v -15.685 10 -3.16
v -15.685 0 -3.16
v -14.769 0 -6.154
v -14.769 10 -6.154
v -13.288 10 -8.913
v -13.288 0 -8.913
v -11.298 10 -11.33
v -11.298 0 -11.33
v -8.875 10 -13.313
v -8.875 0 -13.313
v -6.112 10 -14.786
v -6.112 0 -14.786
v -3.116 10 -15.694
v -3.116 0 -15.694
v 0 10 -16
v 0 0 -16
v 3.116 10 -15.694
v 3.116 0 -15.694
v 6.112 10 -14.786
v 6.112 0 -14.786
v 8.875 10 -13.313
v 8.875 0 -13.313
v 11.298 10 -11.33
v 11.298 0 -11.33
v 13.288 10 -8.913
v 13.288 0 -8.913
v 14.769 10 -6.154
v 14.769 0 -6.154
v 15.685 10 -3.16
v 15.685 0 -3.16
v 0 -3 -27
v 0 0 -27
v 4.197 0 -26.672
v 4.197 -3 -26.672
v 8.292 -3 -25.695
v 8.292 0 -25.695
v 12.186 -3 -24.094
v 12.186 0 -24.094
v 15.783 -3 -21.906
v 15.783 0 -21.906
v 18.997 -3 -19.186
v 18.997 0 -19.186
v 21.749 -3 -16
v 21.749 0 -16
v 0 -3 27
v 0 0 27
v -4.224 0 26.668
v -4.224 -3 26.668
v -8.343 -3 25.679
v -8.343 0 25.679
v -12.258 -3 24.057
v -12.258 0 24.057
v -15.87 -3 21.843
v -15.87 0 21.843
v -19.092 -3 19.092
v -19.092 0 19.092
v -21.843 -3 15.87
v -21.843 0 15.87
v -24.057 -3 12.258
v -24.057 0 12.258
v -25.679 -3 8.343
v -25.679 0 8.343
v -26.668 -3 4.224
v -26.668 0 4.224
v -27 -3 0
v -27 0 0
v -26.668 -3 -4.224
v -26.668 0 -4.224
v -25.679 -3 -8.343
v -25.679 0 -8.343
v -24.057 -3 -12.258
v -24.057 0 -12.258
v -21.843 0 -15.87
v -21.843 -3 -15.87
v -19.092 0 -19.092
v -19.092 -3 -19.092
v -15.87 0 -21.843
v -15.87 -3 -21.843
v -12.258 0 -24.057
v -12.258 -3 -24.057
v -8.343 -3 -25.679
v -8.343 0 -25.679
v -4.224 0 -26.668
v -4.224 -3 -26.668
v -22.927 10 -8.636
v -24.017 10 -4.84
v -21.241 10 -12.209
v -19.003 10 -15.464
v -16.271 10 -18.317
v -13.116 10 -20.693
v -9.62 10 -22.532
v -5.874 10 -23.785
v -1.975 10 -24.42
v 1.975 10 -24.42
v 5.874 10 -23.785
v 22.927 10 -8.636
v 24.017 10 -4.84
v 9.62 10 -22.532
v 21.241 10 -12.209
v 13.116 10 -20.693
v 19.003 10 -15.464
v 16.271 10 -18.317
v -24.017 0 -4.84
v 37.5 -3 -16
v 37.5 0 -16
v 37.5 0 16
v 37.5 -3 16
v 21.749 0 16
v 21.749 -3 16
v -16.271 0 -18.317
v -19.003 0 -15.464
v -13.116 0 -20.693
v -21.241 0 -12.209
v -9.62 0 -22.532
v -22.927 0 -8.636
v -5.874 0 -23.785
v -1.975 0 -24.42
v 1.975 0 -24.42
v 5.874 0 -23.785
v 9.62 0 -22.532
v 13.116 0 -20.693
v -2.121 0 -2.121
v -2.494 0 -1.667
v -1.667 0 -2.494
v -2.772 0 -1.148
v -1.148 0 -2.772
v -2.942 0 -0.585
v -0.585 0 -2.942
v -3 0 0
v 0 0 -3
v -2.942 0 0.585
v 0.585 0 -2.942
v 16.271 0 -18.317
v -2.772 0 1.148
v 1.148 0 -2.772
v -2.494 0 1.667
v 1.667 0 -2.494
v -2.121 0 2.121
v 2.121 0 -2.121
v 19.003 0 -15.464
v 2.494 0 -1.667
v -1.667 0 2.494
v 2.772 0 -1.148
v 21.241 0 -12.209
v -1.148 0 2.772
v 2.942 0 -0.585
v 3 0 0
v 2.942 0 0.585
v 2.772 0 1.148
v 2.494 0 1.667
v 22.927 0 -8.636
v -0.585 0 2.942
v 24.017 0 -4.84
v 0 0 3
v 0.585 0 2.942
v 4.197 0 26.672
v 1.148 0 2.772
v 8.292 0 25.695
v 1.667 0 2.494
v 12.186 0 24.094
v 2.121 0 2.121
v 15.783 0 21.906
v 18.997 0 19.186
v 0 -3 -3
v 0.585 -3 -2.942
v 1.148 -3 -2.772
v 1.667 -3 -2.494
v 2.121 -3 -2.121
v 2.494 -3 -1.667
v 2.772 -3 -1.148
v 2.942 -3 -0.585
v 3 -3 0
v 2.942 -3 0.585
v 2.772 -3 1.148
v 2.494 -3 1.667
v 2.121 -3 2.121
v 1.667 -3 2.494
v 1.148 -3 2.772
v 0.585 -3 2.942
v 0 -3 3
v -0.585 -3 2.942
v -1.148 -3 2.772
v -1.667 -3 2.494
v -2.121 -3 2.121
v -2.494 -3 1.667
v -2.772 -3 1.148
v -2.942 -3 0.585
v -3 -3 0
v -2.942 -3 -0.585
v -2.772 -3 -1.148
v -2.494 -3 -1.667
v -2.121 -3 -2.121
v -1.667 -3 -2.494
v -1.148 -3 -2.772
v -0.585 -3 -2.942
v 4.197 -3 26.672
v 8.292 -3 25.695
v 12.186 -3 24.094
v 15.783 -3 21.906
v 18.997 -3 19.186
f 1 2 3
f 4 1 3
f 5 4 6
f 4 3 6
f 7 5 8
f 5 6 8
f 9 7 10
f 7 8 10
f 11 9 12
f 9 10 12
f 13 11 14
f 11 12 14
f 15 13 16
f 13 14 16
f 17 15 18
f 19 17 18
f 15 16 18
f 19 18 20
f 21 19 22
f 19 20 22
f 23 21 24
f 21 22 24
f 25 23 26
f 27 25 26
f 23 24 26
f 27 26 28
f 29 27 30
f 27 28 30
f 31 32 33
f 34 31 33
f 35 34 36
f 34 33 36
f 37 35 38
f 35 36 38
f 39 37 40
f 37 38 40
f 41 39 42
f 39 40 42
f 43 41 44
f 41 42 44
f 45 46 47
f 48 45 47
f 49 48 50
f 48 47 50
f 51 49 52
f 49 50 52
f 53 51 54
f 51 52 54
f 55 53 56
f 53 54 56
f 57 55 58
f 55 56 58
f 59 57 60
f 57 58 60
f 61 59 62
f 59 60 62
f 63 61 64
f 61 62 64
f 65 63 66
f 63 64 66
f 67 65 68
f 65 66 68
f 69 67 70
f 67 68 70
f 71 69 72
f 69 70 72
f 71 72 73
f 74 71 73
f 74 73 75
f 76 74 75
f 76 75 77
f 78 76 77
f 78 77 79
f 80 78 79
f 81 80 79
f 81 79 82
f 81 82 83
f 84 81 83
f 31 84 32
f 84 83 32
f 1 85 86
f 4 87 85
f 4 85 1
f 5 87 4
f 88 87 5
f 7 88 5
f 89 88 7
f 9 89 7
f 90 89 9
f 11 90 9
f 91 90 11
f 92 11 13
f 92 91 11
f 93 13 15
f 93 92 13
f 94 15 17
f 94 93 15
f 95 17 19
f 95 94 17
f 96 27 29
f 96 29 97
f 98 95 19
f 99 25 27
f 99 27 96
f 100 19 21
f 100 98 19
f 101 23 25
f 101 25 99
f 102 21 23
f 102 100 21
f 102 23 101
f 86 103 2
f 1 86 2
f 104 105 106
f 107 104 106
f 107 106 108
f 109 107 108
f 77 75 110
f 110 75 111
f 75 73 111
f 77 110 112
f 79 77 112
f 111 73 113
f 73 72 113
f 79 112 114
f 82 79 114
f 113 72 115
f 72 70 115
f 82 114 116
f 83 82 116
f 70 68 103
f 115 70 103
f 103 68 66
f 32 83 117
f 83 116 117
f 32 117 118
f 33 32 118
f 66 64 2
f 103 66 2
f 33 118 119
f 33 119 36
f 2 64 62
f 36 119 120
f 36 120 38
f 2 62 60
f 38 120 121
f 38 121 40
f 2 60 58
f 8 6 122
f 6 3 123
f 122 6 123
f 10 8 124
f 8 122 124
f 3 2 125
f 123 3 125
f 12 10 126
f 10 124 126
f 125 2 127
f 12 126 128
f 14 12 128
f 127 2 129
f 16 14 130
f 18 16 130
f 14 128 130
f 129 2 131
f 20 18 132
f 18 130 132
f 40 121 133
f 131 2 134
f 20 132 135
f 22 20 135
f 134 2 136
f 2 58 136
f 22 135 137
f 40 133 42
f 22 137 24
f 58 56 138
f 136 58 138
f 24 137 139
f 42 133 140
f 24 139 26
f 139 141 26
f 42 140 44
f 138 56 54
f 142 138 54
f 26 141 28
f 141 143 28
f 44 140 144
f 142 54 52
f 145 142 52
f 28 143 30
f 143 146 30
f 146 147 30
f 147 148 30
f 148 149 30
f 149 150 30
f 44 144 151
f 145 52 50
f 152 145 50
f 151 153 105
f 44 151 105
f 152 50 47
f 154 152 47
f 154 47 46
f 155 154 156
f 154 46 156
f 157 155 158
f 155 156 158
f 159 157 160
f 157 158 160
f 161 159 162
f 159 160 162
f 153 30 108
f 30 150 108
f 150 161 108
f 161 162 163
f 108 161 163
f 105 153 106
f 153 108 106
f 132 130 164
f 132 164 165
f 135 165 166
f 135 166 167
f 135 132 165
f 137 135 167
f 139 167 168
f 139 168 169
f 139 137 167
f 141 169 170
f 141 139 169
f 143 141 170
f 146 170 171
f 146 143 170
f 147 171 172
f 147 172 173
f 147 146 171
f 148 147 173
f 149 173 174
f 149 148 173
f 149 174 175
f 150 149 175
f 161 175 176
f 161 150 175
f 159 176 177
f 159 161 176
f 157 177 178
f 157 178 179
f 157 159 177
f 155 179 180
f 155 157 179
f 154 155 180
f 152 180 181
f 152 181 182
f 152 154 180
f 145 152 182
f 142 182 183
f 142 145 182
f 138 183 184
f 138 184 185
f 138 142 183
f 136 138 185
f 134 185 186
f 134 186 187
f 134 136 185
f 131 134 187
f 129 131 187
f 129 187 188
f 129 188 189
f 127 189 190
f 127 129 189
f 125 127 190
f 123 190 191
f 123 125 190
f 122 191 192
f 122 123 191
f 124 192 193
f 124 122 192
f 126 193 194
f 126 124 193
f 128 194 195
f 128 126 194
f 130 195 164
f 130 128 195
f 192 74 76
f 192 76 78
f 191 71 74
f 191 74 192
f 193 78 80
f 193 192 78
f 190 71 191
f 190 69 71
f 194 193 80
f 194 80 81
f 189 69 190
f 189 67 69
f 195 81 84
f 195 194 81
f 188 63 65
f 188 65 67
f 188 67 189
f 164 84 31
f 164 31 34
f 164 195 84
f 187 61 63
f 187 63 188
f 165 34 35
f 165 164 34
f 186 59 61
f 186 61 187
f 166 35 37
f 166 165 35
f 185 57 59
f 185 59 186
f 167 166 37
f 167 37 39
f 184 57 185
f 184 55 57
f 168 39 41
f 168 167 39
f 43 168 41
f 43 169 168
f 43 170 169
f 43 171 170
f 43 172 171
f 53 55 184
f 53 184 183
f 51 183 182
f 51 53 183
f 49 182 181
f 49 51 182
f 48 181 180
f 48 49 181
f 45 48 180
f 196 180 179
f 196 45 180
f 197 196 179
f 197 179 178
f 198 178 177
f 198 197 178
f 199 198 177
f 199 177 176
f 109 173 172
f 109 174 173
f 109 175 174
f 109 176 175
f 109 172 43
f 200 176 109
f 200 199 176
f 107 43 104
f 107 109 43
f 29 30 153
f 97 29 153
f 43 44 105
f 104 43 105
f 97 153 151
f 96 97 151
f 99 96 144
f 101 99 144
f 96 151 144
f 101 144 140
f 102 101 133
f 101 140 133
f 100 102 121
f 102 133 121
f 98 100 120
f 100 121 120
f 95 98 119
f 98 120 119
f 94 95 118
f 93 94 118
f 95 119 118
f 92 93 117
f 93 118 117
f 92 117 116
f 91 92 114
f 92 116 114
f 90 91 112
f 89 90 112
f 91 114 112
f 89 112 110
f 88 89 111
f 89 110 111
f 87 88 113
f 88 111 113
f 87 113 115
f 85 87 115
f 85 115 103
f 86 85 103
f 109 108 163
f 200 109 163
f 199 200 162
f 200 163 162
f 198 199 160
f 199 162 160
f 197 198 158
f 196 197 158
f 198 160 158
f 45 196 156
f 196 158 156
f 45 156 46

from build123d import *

# Parameters (mm, degrees)
BOSS_EXTRUDE1_DEPTH = 10
SKETCH2_R           = 3
BOSS_EXTRUDE2_DEPTH = 3


with BuildPart() as part:
    # Sketch1 → Boss-Extrude1 (new body)
    with BuildSketch(Plane(origin=(0, 0, 0), x_dir=(1, 0, 0), z_dir=(0, 1, 0))):
        with BuildLine():
            Line((-24.017268371, 4.839506173), (-15.684746691, 3.160493827))
            ThreePointArc((-15.684746691, 3.160493827), (0, 16), (15.684746691, 3.160493827))
            Line((15.684746691, 3.160493827), (24.017268371, 4.839506173))
            ThreePointArc((24.017268371, 4.839506173), (0, 24.5), (-24.017268371, 4.839506173))
        make_face()
    extrude(amount=BOSS_EXTRUDE1_DEPTH)

    # Sketch2 → Boss-Extrude2 (add)
    with BuildSketch(Plane.XZ):
        with BuildLine():
            Line((37.5, -16), (37.5, 16))
            Line((37.5, 16), (21.748563171, 16))
            ThreePointArc((21.748563171, 16), (12.186057607, 24.093567606), (0, 27))
            ThreePointArc((0, 27), (-27, 0), (0, -27))
            ThreePointArc((0, -27), (12.186057607, -24.093567606), (21.748563171, -16))
            Line((21.748563171, -16), (37.5, -16))
        make_face()
        Circle(SKETCH2_R, mode=Mode.SUBTRACT)
    extrude(amount=BOSS_EXTRUDE2_DEPTH)


solid = part.part
